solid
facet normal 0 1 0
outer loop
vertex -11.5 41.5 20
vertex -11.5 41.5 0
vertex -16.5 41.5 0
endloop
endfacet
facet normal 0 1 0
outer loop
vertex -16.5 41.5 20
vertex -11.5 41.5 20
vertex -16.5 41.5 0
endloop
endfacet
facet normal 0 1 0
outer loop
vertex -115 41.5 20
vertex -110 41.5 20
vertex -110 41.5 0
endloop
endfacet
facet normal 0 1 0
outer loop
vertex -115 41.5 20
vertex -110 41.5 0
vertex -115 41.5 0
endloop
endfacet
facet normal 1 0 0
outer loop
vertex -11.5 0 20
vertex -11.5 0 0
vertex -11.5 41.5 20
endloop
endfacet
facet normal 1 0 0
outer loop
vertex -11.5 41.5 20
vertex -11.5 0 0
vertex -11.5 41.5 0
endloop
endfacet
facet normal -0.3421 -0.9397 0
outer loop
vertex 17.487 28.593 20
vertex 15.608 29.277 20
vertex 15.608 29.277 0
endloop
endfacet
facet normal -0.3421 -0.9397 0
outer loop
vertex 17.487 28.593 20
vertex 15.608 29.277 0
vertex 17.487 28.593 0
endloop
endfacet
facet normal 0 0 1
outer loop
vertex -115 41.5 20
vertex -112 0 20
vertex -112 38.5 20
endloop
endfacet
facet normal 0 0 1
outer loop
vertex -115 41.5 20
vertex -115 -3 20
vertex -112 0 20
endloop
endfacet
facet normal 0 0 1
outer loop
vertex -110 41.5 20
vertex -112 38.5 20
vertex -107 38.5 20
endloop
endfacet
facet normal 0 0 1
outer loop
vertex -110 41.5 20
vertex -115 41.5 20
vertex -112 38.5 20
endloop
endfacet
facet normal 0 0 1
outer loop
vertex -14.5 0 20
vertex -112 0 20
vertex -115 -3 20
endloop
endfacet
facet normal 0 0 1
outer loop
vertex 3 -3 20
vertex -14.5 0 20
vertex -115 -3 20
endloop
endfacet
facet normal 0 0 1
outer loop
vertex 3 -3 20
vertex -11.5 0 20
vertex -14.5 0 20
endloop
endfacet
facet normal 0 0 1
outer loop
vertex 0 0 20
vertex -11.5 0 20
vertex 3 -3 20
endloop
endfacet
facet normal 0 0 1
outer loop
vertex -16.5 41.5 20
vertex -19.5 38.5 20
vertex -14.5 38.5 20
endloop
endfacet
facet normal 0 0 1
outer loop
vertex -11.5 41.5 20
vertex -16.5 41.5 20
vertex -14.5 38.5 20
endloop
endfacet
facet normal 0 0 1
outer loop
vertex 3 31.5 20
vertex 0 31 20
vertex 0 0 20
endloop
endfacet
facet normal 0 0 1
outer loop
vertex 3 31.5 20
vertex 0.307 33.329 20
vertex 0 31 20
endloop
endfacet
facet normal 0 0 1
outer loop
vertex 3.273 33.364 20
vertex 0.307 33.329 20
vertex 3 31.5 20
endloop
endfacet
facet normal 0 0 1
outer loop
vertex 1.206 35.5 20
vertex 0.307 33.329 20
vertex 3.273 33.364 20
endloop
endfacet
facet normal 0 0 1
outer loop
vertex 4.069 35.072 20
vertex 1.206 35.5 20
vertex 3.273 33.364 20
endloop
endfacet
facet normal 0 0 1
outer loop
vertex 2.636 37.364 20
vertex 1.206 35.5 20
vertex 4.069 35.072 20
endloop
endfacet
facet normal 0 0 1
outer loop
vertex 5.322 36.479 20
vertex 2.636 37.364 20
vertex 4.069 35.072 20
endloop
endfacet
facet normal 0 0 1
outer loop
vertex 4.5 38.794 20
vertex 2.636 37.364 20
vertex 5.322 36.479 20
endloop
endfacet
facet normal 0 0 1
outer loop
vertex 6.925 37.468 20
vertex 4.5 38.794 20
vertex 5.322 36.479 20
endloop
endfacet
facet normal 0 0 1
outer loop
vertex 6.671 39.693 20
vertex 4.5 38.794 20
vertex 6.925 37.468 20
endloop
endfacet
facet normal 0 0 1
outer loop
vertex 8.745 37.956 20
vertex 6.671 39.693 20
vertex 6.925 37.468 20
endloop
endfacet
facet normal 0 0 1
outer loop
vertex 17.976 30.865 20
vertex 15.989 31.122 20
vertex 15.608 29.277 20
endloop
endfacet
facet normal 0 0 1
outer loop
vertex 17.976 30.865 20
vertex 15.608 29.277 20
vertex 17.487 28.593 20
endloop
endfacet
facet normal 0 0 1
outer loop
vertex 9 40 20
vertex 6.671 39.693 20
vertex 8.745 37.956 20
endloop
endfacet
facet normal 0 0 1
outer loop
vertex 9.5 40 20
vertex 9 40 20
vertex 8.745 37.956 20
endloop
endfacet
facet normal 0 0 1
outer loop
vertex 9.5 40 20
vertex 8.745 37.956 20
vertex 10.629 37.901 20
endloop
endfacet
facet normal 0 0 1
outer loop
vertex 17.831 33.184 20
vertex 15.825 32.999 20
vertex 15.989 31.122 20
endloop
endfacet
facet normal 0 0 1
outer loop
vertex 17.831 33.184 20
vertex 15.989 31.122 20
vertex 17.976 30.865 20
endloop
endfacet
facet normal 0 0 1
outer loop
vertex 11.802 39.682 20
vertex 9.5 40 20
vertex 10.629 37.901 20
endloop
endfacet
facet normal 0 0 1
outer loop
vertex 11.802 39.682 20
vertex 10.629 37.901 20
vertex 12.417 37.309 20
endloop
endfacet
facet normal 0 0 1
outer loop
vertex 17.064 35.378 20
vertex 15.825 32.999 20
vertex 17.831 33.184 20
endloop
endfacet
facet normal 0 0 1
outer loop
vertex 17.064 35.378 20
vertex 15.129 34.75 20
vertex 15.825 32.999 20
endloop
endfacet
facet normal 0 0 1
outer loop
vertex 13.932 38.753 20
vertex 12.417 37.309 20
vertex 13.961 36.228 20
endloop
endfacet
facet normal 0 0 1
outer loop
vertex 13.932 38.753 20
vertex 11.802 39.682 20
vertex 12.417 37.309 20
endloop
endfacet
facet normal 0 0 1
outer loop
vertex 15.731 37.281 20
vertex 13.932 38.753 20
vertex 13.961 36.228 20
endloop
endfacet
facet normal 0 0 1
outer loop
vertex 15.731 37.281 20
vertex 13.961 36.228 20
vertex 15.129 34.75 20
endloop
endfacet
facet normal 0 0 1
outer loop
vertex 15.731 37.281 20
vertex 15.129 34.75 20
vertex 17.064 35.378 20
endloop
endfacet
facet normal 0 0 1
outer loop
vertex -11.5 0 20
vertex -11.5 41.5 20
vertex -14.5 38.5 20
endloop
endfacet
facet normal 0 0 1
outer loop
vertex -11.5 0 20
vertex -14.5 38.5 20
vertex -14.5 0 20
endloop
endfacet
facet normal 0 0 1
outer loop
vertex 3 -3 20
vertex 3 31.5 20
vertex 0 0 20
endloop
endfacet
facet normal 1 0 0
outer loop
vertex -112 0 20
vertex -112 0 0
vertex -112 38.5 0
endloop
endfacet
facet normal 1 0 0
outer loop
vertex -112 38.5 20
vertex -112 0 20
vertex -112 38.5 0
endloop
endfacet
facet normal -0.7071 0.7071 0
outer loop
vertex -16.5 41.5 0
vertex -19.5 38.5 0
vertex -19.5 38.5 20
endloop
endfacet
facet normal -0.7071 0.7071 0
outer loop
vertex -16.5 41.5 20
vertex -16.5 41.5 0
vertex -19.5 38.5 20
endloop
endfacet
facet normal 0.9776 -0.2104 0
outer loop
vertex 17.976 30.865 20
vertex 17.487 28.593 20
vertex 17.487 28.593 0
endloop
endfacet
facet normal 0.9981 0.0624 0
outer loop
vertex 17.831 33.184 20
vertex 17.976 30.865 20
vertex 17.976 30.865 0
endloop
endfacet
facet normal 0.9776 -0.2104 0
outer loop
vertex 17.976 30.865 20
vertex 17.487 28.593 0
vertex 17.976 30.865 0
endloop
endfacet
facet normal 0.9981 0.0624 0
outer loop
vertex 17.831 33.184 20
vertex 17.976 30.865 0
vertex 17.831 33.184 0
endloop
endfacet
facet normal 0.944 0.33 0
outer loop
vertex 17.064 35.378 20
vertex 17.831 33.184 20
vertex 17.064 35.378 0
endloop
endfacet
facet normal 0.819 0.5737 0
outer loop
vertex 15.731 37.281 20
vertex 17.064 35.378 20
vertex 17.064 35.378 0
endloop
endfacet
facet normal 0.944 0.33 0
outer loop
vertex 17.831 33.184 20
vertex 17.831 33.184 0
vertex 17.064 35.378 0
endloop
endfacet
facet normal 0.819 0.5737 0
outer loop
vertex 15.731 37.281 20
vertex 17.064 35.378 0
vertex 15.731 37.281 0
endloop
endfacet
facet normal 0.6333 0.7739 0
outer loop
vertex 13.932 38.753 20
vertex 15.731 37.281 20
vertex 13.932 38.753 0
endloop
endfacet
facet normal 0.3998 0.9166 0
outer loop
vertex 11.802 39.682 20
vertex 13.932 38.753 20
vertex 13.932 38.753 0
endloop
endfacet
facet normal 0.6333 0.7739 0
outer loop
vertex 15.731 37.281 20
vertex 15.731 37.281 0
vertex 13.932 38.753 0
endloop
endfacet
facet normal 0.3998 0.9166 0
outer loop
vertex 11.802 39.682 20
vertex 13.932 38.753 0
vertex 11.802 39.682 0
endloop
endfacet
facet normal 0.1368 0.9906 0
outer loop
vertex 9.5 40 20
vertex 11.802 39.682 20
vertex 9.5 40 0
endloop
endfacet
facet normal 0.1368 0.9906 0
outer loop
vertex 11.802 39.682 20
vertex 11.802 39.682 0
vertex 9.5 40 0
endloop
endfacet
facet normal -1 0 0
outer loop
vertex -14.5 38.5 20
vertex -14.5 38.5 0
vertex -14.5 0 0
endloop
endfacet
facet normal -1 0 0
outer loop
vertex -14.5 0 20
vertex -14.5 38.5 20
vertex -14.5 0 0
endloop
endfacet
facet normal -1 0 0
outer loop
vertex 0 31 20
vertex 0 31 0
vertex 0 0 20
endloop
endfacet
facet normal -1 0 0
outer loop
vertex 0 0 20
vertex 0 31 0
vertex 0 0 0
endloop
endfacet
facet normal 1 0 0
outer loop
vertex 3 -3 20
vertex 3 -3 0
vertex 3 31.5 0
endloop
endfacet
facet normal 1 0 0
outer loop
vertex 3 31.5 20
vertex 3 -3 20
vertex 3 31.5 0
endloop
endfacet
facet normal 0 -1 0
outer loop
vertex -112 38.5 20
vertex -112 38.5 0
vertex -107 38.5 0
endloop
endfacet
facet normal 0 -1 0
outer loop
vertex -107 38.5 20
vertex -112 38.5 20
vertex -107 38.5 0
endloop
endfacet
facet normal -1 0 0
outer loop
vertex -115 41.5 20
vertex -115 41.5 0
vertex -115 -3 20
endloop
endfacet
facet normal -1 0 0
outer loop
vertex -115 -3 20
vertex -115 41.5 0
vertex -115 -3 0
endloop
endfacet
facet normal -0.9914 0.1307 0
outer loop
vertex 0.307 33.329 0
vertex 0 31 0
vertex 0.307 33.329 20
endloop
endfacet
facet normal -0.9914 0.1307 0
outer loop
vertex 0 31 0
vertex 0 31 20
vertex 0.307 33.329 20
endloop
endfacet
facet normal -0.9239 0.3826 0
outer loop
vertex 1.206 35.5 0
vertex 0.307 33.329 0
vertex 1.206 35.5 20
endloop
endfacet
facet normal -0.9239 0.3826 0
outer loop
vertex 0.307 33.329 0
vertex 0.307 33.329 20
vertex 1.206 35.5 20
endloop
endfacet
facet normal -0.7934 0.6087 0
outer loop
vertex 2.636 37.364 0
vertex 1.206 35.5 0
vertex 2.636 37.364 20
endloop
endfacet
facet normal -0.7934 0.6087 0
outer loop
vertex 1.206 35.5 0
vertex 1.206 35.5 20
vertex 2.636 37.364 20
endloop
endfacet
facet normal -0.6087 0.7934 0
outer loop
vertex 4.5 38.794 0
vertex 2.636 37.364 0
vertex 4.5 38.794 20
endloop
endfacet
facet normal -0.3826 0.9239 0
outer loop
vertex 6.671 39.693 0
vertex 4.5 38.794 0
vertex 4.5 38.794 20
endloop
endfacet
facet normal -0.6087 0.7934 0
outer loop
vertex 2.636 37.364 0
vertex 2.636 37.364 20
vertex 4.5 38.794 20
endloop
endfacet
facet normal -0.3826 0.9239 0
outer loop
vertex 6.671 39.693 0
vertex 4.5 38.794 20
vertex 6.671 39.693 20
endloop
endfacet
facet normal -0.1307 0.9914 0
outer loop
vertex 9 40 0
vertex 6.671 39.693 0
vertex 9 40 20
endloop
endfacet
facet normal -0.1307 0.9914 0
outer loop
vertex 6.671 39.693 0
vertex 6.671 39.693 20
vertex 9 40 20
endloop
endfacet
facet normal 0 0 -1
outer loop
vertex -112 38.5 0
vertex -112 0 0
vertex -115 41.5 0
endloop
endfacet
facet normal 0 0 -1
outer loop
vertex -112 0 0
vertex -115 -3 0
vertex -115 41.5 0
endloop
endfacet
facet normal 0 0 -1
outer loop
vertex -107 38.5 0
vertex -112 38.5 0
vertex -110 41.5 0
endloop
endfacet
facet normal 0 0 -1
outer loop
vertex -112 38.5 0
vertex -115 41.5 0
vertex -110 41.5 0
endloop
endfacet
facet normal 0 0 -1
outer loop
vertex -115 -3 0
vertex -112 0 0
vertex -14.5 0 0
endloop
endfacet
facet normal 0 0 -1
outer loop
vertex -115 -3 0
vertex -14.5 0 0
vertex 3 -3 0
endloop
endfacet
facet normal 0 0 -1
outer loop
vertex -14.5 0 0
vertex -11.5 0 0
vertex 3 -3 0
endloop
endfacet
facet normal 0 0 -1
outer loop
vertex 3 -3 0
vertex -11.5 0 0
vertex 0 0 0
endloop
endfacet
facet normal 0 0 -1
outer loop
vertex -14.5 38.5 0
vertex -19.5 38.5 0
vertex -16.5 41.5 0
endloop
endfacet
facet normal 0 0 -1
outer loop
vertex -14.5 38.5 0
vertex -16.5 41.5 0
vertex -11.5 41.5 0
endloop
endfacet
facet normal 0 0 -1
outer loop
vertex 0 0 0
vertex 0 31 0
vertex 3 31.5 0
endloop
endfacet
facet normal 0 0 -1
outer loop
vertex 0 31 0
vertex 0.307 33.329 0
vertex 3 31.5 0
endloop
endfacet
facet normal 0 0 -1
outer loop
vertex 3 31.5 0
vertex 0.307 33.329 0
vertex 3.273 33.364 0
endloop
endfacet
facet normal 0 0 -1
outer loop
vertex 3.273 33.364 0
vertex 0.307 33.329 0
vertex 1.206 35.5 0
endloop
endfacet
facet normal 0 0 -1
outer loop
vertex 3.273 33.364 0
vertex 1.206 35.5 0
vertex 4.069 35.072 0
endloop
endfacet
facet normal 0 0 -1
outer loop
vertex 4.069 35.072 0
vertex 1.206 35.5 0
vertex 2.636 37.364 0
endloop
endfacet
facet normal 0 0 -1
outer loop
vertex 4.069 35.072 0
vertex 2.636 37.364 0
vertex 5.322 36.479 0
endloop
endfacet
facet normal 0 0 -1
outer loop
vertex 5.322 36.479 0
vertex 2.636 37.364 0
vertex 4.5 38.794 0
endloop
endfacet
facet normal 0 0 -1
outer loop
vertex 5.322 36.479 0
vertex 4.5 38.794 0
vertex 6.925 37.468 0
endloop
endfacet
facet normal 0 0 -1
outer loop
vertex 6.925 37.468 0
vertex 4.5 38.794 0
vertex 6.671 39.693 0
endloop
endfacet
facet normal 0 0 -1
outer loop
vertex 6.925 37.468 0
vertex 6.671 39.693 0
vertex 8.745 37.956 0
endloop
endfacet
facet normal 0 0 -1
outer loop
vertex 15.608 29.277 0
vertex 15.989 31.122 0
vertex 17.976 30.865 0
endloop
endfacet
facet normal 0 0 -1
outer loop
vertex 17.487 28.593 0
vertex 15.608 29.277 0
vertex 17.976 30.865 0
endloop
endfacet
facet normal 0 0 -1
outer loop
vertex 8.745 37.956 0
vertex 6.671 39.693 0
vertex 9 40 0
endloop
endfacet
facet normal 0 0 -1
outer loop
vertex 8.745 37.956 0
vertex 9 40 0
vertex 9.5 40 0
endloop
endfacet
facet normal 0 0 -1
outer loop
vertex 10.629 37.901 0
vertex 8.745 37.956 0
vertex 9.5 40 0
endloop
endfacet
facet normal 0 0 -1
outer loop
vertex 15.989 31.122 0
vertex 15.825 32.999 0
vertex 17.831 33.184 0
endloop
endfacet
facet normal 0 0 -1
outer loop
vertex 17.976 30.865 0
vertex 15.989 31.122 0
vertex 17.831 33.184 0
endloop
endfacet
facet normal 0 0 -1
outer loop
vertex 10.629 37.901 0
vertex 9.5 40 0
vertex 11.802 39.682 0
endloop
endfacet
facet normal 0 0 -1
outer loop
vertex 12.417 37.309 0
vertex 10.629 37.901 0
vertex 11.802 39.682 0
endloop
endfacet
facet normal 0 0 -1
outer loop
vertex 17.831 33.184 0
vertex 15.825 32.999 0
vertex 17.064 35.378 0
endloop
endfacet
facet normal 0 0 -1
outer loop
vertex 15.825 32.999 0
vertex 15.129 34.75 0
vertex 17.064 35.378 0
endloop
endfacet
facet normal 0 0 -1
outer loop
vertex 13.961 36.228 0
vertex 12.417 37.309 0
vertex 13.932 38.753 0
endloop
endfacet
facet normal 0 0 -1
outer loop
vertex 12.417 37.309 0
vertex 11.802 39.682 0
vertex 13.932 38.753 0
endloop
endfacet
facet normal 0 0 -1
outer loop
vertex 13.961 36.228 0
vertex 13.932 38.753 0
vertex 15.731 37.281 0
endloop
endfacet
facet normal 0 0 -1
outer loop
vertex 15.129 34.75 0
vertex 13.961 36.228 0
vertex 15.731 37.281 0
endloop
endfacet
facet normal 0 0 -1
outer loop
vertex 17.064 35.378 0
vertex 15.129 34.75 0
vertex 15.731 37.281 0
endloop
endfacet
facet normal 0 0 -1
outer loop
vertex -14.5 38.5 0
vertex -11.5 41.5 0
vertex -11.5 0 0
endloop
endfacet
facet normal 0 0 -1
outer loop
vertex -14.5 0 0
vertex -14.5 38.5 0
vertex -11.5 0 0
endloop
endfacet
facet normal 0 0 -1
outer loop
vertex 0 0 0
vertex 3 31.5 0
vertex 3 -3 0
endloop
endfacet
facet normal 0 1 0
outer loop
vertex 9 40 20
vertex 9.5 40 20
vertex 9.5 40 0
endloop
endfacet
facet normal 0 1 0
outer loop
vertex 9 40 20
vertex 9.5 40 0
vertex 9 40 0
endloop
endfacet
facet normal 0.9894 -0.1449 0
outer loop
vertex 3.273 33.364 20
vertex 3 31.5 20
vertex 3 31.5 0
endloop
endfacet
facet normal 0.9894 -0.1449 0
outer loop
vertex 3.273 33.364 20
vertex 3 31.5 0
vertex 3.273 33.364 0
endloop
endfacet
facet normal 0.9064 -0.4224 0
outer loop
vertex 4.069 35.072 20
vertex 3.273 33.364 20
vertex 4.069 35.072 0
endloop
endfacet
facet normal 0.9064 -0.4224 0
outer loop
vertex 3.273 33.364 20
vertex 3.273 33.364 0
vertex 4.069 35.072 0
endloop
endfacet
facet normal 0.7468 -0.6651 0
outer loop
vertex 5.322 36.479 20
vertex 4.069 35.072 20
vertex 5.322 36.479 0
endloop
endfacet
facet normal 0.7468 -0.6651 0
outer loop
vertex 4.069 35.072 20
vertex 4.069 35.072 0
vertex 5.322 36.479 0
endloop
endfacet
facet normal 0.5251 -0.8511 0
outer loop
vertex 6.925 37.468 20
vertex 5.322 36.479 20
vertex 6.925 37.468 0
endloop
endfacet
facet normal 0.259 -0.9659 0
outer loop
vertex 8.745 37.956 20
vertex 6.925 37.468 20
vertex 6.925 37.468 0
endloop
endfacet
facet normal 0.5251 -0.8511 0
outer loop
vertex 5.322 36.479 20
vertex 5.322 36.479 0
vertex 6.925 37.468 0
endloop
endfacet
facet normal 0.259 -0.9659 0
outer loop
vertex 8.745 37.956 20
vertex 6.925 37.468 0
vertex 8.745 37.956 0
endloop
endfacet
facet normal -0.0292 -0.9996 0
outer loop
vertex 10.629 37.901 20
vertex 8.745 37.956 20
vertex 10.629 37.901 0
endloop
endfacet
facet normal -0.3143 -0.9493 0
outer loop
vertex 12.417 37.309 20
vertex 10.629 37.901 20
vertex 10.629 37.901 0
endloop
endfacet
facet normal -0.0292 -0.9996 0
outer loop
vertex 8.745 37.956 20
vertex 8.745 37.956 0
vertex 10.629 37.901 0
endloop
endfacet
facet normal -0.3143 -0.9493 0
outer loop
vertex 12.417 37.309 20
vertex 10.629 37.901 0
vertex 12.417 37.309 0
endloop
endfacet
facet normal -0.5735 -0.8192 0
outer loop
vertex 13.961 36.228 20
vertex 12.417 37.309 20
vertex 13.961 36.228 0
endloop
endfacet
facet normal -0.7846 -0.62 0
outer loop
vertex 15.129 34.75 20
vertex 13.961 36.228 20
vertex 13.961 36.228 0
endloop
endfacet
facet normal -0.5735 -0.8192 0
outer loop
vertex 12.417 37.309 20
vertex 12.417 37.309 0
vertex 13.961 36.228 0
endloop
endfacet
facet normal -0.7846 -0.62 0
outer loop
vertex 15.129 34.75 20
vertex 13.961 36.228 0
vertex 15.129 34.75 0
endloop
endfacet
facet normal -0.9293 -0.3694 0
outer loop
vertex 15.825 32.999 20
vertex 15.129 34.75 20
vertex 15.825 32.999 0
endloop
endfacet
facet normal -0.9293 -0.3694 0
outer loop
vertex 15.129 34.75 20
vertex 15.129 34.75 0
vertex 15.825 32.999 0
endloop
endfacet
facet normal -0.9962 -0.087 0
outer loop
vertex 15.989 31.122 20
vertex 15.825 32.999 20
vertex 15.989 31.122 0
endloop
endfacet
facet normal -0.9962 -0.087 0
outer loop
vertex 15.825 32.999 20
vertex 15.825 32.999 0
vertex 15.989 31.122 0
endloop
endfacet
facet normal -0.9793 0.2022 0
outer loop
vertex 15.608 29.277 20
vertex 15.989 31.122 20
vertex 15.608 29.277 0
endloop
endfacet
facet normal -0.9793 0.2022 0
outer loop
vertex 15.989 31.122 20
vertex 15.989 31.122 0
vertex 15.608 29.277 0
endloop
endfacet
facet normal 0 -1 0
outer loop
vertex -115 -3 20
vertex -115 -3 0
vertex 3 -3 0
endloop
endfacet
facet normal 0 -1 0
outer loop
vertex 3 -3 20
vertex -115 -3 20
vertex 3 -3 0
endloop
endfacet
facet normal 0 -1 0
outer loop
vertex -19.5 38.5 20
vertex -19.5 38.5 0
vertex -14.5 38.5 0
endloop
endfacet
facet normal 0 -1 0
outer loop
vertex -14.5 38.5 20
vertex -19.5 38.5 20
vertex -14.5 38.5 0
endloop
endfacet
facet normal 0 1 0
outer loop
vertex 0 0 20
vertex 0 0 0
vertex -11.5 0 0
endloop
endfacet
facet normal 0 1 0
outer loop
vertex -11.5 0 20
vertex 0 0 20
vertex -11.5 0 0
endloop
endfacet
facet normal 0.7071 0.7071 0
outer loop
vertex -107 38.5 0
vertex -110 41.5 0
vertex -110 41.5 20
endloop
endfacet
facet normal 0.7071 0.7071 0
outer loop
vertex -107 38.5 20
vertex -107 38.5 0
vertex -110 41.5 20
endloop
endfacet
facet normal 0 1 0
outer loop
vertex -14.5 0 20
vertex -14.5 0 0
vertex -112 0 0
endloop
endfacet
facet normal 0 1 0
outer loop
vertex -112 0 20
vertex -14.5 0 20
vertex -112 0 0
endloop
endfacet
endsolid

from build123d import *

# Parameters (mm, degrees)
F1_DEPTH = 20
F2_SIZE  = 2.99999
F3_R     = 9


# Not quite as in the source:
# - a fillet or chamfer is up to 0.001 mm smaller than in the source, because OpenCascade refuses the exact size


with BuildPart() as f1:
    # F0 (on Top) → F1 (new body)
    with BuildSketch(Plane.XY):
        with BuildLine():
            Line((0, 40), (0, 0))
            Line((0, 0), (-11.5, 0))
            Line((-11.5, 0), (-11.5, 41.5))
            Line((-11.5, 41.5), (-19.5, 41.5))
            Line((-19.5, 41.5), (-19.5, 38.5))
            Line((-19.5, 38.5), (-14.5, 38.5))
            Line((-14.5, 38.5), (-14.5, 0))
            Line((-14.5, 0), (-112, 0))
            Line((-112, 0), (-112, 38.5))
            Line((-112, 38.5), (-107, 38.5))
            Line((-107, 38.5), (-107, 41.5))
            Line((-107, 41.5), (-115, 41.5))
            Line((-115, 41.5), (-115, -3))
            Line((-115, -3), (3, -3))
            Line((3, -3), (3, 31.5))
            ThreePointArc((3, 31.5), (10.6287131548, 37.9012503946), (15.6080020351, 29.2768690684))
            Line((15.6080020351, 29.2768690684), (17.4873872767, 28.5928287817))
            ThreePointArc((17.4873872767, 28.5928287817), (16.4627923765, 36.375399709), (9.5, 40))
            Line((9.5, 40), (3, 40))
            Line((3, 40), (0, 40))
        make_face()
    extrude(amount=F1_DEPTH)

    # F2 (size 3 in the source; OpenCascade refuses exactly that, so slightly less here)
    f2_edges = [f1.edges().sort_by_distance(p)[0] for p in [
        (-107, 41.5, 10),
        (-19.5, 41.5, 10),
    ]]
    chamfer(f2_edges, length=F2_SIZE)

    # F3
    f3_edges = [f1.edges().sort_by_distance(p)[0] for p in [
        (0, 40, 10),
    ]]
    fillet(f3_edges, radius=F3_R)


solid = f1.part
